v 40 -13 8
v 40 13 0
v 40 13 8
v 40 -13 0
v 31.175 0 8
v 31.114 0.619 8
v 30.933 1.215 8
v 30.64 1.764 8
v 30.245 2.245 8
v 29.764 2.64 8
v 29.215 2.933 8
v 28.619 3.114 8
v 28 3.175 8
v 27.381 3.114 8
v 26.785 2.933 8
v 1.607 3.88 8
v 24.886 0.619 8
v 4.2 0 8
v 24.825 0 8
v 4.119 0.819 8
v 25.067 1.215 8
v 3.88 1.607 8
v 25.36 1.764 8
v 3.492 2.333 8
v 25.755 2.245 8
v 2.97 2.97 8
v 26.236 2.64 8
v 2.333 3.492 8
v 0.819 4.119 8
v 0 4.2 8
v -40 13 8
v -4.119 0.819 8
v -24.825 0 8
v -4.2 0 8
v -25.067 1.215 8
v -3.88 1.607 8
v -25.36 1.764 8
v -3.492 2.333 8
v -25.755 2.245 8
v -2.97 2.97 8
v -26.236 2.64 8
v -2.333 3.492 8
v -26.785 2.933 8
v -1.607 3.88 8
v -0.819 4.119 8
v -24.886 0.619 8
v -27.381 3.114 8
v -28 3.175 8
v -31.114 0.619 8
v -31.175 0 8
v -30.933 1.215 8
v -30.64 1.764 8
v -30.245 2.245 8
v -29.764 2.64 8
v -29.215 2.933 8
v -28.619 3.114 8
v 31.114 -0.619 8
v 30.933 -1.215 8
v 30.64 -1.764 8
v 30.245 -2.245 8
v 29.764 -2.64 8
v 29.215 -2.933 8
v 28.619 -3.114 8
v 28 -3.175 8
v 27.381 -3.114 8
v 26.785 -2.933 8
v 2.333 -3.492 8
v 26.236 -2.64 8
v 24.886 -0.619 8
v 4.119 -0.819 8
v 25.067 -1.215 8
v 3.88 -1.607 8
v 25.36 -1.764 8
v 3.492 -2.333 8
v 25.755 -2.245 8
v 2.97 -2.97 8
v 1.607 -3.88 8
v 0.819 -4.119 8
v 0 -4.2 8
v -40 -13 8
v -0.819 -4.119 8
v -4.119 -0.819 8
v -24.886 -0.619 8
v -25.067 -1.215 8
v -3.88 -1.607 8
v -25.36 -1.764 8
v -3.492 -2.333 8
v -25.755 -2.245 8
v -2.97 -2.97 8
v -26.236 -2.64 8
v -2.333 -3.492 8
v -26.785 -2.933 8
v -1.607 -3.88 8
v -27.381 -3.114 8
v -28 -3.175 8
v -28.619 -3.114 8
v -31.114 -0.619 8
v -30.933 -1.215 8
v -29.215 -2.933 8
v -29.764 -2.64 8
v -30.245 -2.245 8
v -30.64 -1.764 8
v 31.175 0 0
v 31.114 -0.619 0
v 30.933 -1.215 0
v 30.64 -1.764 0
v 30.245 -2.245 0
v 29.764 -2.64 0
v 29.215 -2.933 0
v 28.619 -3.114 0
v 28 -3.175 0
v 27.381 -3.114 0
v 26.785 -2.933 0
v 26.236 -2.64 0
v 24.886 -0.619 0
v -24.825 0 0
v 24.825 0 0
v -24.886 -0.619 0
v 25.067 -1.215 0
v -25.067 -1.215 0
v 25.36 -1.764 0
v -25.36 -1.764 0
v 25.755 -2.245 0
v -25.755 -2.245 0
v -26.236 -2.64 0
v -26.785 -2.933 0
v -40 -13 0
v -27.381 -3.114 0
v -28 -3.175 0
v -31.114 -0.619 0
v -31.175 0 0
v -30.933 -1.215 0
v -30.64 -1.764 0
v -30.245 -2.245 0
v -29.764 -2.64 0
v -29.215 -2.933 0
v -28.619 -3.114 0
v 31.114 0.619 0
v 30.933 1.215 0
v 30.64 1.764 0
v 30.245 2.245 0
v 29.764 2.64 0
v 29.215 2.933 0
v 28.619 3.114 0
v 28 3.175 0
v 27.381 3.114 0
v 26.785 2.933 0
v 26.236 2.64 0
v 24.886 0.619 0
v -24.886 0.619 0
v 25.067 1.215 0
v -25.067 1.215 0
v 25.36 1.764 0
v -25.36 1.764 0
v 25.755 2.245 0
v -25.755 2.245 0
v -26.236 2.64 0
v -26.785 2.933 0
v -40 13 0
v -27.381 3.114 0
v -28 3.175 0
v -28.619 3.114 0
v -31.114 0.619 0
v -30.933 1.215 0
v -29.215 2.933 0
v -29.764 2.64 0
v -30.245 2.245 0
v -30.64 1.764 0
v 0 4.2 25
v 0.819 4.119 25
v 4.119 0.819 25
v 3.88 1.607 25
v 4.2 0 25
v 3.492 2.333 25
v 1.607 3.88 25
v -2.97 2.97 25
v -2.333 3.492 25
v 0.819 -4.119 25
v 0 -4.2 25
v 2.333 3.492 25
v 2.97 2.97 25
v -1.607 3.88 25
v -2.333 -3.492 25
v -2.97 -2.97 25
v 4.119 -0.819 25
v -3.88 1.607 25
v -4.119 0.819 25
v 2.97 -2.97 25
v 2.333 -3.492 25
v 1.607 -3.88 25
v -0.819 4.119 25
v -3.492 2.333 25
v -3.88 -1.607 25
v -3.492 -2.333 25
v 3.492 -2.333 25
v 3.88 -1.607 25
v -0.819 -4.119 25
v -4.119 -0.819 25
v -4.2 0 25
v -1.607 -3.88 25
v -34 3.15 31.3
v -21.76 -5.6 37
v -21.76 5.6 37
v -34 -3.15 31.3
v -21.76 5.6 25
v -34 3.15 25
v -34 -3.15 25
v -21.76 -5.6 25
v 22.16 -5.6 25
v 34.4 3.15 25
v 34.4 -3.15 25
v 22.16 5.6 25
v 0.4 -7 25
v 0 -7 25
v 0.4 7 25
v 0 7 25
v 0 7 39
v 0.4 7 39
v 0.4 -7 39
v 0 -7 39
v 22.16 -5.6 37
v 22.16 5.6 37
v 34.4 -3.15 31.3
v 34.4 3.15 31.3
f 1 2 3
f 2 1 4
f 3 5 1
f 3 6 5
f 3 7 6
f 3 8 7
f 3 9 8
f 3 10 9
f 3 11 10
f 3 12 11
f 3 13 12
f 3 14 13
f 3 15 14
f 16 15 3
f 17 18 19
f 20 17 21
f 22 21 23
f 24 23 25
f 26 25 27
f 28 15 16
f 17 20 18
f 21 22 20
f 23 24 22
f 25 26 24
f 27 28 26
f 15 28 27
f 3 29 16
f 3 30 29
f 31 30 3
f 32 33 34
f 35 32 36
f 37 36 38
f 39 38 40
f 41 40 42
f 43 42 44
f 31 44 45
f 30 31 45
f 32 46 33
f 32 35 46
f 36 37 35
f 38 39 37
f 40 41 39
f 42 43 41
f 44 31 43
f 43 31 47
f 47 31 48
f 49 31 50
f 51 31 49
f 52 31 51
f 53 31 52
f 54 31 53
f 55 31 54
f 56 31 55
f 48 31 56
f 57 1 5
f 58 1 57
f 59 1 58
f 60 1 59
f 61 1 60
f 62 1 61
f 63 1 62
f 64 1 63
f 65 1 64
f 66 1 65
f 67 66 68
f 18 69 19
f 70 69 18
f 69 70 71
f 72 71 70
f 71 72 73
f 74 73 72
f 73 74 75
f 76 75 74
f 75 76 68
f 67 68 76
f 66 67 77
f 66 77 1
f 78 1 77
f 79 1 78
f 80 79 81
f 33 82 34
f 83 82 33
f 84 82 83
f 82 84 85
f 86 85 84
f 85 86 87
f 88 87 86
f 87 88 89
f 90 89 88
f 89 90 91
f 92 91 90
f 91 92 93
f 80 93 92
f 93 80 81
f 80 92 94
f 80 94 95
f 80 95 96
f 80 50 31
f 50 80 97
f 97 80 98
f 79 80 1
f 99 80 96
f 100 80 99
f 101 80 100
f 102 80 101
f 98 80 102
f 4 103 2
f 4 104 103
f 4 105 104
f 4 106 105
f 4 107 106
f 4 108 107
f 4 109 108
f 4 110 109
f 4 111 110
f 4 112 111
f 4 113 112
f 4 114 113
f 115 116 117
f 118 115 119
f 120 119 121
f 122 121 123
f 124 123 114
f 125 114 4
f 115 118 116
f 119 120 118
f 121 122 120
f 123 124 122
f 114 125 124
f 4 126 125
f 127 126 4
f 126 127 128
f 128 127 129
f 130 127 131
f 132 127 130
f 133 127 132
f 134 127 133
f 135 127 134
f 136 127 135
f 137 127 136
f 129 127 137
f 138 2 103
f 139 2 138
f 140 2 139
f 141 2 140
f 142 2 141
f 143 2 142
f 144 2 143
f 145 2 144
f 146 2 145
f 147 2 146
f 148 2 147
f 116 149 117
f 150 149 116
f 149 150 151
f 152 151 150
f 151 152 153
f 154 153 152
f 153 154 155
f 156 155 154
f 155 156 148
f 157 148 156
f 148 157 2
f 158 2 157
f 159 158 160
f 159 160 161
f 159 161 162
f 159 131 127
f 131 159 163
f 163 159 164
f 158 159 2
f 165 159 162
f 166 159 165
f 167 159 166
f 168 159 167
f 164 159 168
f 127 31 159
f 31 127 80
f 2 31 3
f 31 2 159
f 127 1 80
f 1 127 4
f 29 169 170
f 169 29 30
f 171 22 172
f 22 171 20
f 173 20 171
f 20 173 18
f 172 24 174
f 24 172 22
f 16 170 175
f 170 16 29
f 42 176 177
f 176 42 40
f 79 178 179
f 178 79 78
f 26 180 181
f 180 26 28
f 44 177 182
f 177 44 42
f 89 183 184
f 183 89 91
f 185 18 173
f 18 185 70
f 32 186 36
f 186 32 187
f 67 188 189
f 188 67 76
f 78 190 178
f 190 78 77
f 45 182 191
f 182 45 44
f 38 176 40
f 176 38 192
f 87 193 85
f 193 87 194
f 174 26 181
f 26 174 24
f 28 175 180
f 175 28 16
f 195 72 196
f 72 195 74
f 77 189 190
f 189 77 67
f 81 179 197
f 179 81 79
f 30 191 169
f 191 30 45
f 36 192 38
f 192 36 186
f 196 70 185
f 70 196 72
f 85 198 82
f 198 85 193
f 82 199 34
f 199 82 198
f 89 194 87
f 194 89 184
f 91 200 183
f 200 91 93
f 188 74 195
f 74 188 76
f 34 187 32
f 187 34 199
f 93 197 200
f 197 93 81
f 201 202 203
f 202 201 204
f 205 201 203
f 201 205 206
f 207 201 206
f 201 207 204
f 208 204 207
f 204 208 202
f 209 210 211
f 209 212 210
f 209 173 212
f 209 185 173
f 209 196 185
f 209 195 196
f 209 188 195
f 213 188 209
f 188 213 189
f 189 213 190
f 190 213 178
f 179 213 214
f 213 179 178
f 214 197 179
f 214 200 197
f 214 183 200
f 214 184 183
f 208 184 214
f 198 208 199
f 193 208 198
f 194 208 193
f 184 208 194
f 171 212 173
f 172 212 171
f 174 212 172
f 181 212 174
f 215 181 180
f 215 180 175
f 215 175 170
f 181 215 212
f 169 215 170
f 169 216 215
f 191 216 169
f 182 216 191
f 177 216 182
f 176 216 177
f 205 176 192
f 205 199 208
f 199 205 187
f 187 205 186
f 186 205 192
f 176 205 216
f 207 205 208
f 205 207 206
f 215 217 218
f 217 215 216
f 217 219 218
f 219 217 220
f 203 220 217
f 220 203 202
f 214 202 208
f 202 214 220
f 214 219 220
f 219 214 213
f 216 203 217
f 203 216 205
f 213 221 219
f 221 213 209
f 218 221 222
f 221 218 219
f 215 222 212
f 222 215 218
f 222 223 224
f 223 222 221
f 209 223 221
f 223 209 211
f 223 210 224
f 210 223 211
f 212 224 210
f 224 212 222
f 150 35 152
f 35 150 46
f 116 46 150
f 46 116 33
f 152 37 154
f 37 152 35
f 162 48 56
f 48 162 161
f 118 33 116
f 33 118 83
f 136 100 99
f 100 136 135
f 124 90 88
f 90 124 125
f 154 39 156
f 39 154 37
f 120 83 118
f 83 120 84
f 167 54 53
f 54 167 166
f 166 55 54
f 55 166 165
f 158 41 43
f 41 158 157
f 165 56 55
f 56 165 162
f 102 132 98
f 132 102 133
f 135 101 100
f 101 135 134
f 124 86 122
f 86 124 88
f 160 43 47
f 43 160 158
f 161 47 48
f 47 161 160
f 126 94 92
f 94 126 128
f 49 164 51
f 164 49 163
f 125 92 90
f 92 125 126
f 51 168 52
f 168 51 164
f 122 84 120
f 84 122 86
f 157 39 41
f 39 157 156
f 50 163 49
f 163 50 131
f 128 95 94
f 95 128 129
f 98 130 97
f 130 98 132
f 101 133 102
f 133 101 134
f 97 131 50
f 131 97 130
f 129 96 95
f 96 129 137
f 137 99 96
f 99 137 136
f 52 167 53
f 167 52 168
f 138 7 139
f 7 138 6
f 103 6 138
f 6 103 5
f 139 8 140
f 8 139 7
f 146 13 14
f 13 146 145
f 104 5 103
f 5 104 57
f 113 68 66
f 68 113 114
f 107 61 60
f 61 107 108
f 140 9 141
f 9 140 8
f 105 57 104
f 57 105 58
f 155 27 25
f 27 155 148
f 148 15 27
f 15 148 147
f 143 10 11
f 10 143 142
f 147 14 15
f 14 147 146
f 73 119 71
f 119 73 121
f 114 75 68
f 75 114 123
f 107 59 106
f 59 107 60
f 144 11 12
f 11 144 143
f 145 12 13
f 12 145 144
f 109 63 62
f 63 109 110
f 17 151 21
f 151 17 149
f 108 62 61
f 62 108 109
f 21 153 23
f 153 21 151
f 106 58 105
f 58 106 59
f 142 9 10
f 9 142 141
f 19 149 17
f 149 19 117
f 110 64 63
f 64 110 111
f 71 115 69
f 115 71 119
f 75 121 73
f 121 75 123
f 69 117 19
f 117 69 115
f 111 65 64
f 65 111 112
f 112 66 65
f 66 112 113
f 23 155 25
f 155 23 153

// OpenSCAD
$fn = 32;

// ----------------------------------------------------------------------
// Boat cleat: 80 mm base, horn 32 mm up
// ----------------------------------------------------------------------

// --- parameters (mm) ---
base_l = 80;              // base length
base_w = 26;              // base width
base_t = 8;               // base thickness
horn_len = 68;            // horn length
horn_d = 14;              // horn diameter at the middle
horn_z = 32;              // horn axis height
end_drop = 8;             // how far the horn tips drop
post_d = 8.4;             // centre post diameter
holes_d = 6.35;           // fixing holes
hole_x = 28;              // fixing hole spacing

difference() {
  union() {
    translate([-40, -13, 0]) cube([base_l, base_w, base_t]);
    /* centre post, sunk 1 mm into the base */
    translate([0, 0, 7]) cylinder(h = 25, d = post_d);
    /* horn: a hull chain of boxes, full in the middle and lighter at the tips */
    hull() {
      translate([-34, -3.15, 25]) cube([0.4, 6.3, 6.3], center = false);
      translate([-21.76, -5.6, 25]) cube([0.4, 11.2, 12], center = false);
    }
    hull() {
      translate([-21.76, -5.6, 25]) cube([0.4, 11.2, 12], center = false);
      translate([0, -7, 25]) cube([0.4, 14, 14], center = false);
    }
    hull() {
      translate([0, -7, 25]) cube([0.4, 14, 14], center = false);
      translate([21.76, -5.6, 25]) cube([0.4, 11.2, 12], center = false);
    }
    hull() {
      translate([21.76, -5.6, 25]) cube([0.4, 11.2, 12], center = false);
      translate([34, -3.15, 25]) cube([0.4, 6.3, 6.3], center = false);
    }
  }
  translate([-28, 0, -2.5]) cylinder(h = base_t + 5, d = holes_d);
  translate([28, 0, -2.5]) cylinder(h = base_t + 5, d = holes_d);
}
